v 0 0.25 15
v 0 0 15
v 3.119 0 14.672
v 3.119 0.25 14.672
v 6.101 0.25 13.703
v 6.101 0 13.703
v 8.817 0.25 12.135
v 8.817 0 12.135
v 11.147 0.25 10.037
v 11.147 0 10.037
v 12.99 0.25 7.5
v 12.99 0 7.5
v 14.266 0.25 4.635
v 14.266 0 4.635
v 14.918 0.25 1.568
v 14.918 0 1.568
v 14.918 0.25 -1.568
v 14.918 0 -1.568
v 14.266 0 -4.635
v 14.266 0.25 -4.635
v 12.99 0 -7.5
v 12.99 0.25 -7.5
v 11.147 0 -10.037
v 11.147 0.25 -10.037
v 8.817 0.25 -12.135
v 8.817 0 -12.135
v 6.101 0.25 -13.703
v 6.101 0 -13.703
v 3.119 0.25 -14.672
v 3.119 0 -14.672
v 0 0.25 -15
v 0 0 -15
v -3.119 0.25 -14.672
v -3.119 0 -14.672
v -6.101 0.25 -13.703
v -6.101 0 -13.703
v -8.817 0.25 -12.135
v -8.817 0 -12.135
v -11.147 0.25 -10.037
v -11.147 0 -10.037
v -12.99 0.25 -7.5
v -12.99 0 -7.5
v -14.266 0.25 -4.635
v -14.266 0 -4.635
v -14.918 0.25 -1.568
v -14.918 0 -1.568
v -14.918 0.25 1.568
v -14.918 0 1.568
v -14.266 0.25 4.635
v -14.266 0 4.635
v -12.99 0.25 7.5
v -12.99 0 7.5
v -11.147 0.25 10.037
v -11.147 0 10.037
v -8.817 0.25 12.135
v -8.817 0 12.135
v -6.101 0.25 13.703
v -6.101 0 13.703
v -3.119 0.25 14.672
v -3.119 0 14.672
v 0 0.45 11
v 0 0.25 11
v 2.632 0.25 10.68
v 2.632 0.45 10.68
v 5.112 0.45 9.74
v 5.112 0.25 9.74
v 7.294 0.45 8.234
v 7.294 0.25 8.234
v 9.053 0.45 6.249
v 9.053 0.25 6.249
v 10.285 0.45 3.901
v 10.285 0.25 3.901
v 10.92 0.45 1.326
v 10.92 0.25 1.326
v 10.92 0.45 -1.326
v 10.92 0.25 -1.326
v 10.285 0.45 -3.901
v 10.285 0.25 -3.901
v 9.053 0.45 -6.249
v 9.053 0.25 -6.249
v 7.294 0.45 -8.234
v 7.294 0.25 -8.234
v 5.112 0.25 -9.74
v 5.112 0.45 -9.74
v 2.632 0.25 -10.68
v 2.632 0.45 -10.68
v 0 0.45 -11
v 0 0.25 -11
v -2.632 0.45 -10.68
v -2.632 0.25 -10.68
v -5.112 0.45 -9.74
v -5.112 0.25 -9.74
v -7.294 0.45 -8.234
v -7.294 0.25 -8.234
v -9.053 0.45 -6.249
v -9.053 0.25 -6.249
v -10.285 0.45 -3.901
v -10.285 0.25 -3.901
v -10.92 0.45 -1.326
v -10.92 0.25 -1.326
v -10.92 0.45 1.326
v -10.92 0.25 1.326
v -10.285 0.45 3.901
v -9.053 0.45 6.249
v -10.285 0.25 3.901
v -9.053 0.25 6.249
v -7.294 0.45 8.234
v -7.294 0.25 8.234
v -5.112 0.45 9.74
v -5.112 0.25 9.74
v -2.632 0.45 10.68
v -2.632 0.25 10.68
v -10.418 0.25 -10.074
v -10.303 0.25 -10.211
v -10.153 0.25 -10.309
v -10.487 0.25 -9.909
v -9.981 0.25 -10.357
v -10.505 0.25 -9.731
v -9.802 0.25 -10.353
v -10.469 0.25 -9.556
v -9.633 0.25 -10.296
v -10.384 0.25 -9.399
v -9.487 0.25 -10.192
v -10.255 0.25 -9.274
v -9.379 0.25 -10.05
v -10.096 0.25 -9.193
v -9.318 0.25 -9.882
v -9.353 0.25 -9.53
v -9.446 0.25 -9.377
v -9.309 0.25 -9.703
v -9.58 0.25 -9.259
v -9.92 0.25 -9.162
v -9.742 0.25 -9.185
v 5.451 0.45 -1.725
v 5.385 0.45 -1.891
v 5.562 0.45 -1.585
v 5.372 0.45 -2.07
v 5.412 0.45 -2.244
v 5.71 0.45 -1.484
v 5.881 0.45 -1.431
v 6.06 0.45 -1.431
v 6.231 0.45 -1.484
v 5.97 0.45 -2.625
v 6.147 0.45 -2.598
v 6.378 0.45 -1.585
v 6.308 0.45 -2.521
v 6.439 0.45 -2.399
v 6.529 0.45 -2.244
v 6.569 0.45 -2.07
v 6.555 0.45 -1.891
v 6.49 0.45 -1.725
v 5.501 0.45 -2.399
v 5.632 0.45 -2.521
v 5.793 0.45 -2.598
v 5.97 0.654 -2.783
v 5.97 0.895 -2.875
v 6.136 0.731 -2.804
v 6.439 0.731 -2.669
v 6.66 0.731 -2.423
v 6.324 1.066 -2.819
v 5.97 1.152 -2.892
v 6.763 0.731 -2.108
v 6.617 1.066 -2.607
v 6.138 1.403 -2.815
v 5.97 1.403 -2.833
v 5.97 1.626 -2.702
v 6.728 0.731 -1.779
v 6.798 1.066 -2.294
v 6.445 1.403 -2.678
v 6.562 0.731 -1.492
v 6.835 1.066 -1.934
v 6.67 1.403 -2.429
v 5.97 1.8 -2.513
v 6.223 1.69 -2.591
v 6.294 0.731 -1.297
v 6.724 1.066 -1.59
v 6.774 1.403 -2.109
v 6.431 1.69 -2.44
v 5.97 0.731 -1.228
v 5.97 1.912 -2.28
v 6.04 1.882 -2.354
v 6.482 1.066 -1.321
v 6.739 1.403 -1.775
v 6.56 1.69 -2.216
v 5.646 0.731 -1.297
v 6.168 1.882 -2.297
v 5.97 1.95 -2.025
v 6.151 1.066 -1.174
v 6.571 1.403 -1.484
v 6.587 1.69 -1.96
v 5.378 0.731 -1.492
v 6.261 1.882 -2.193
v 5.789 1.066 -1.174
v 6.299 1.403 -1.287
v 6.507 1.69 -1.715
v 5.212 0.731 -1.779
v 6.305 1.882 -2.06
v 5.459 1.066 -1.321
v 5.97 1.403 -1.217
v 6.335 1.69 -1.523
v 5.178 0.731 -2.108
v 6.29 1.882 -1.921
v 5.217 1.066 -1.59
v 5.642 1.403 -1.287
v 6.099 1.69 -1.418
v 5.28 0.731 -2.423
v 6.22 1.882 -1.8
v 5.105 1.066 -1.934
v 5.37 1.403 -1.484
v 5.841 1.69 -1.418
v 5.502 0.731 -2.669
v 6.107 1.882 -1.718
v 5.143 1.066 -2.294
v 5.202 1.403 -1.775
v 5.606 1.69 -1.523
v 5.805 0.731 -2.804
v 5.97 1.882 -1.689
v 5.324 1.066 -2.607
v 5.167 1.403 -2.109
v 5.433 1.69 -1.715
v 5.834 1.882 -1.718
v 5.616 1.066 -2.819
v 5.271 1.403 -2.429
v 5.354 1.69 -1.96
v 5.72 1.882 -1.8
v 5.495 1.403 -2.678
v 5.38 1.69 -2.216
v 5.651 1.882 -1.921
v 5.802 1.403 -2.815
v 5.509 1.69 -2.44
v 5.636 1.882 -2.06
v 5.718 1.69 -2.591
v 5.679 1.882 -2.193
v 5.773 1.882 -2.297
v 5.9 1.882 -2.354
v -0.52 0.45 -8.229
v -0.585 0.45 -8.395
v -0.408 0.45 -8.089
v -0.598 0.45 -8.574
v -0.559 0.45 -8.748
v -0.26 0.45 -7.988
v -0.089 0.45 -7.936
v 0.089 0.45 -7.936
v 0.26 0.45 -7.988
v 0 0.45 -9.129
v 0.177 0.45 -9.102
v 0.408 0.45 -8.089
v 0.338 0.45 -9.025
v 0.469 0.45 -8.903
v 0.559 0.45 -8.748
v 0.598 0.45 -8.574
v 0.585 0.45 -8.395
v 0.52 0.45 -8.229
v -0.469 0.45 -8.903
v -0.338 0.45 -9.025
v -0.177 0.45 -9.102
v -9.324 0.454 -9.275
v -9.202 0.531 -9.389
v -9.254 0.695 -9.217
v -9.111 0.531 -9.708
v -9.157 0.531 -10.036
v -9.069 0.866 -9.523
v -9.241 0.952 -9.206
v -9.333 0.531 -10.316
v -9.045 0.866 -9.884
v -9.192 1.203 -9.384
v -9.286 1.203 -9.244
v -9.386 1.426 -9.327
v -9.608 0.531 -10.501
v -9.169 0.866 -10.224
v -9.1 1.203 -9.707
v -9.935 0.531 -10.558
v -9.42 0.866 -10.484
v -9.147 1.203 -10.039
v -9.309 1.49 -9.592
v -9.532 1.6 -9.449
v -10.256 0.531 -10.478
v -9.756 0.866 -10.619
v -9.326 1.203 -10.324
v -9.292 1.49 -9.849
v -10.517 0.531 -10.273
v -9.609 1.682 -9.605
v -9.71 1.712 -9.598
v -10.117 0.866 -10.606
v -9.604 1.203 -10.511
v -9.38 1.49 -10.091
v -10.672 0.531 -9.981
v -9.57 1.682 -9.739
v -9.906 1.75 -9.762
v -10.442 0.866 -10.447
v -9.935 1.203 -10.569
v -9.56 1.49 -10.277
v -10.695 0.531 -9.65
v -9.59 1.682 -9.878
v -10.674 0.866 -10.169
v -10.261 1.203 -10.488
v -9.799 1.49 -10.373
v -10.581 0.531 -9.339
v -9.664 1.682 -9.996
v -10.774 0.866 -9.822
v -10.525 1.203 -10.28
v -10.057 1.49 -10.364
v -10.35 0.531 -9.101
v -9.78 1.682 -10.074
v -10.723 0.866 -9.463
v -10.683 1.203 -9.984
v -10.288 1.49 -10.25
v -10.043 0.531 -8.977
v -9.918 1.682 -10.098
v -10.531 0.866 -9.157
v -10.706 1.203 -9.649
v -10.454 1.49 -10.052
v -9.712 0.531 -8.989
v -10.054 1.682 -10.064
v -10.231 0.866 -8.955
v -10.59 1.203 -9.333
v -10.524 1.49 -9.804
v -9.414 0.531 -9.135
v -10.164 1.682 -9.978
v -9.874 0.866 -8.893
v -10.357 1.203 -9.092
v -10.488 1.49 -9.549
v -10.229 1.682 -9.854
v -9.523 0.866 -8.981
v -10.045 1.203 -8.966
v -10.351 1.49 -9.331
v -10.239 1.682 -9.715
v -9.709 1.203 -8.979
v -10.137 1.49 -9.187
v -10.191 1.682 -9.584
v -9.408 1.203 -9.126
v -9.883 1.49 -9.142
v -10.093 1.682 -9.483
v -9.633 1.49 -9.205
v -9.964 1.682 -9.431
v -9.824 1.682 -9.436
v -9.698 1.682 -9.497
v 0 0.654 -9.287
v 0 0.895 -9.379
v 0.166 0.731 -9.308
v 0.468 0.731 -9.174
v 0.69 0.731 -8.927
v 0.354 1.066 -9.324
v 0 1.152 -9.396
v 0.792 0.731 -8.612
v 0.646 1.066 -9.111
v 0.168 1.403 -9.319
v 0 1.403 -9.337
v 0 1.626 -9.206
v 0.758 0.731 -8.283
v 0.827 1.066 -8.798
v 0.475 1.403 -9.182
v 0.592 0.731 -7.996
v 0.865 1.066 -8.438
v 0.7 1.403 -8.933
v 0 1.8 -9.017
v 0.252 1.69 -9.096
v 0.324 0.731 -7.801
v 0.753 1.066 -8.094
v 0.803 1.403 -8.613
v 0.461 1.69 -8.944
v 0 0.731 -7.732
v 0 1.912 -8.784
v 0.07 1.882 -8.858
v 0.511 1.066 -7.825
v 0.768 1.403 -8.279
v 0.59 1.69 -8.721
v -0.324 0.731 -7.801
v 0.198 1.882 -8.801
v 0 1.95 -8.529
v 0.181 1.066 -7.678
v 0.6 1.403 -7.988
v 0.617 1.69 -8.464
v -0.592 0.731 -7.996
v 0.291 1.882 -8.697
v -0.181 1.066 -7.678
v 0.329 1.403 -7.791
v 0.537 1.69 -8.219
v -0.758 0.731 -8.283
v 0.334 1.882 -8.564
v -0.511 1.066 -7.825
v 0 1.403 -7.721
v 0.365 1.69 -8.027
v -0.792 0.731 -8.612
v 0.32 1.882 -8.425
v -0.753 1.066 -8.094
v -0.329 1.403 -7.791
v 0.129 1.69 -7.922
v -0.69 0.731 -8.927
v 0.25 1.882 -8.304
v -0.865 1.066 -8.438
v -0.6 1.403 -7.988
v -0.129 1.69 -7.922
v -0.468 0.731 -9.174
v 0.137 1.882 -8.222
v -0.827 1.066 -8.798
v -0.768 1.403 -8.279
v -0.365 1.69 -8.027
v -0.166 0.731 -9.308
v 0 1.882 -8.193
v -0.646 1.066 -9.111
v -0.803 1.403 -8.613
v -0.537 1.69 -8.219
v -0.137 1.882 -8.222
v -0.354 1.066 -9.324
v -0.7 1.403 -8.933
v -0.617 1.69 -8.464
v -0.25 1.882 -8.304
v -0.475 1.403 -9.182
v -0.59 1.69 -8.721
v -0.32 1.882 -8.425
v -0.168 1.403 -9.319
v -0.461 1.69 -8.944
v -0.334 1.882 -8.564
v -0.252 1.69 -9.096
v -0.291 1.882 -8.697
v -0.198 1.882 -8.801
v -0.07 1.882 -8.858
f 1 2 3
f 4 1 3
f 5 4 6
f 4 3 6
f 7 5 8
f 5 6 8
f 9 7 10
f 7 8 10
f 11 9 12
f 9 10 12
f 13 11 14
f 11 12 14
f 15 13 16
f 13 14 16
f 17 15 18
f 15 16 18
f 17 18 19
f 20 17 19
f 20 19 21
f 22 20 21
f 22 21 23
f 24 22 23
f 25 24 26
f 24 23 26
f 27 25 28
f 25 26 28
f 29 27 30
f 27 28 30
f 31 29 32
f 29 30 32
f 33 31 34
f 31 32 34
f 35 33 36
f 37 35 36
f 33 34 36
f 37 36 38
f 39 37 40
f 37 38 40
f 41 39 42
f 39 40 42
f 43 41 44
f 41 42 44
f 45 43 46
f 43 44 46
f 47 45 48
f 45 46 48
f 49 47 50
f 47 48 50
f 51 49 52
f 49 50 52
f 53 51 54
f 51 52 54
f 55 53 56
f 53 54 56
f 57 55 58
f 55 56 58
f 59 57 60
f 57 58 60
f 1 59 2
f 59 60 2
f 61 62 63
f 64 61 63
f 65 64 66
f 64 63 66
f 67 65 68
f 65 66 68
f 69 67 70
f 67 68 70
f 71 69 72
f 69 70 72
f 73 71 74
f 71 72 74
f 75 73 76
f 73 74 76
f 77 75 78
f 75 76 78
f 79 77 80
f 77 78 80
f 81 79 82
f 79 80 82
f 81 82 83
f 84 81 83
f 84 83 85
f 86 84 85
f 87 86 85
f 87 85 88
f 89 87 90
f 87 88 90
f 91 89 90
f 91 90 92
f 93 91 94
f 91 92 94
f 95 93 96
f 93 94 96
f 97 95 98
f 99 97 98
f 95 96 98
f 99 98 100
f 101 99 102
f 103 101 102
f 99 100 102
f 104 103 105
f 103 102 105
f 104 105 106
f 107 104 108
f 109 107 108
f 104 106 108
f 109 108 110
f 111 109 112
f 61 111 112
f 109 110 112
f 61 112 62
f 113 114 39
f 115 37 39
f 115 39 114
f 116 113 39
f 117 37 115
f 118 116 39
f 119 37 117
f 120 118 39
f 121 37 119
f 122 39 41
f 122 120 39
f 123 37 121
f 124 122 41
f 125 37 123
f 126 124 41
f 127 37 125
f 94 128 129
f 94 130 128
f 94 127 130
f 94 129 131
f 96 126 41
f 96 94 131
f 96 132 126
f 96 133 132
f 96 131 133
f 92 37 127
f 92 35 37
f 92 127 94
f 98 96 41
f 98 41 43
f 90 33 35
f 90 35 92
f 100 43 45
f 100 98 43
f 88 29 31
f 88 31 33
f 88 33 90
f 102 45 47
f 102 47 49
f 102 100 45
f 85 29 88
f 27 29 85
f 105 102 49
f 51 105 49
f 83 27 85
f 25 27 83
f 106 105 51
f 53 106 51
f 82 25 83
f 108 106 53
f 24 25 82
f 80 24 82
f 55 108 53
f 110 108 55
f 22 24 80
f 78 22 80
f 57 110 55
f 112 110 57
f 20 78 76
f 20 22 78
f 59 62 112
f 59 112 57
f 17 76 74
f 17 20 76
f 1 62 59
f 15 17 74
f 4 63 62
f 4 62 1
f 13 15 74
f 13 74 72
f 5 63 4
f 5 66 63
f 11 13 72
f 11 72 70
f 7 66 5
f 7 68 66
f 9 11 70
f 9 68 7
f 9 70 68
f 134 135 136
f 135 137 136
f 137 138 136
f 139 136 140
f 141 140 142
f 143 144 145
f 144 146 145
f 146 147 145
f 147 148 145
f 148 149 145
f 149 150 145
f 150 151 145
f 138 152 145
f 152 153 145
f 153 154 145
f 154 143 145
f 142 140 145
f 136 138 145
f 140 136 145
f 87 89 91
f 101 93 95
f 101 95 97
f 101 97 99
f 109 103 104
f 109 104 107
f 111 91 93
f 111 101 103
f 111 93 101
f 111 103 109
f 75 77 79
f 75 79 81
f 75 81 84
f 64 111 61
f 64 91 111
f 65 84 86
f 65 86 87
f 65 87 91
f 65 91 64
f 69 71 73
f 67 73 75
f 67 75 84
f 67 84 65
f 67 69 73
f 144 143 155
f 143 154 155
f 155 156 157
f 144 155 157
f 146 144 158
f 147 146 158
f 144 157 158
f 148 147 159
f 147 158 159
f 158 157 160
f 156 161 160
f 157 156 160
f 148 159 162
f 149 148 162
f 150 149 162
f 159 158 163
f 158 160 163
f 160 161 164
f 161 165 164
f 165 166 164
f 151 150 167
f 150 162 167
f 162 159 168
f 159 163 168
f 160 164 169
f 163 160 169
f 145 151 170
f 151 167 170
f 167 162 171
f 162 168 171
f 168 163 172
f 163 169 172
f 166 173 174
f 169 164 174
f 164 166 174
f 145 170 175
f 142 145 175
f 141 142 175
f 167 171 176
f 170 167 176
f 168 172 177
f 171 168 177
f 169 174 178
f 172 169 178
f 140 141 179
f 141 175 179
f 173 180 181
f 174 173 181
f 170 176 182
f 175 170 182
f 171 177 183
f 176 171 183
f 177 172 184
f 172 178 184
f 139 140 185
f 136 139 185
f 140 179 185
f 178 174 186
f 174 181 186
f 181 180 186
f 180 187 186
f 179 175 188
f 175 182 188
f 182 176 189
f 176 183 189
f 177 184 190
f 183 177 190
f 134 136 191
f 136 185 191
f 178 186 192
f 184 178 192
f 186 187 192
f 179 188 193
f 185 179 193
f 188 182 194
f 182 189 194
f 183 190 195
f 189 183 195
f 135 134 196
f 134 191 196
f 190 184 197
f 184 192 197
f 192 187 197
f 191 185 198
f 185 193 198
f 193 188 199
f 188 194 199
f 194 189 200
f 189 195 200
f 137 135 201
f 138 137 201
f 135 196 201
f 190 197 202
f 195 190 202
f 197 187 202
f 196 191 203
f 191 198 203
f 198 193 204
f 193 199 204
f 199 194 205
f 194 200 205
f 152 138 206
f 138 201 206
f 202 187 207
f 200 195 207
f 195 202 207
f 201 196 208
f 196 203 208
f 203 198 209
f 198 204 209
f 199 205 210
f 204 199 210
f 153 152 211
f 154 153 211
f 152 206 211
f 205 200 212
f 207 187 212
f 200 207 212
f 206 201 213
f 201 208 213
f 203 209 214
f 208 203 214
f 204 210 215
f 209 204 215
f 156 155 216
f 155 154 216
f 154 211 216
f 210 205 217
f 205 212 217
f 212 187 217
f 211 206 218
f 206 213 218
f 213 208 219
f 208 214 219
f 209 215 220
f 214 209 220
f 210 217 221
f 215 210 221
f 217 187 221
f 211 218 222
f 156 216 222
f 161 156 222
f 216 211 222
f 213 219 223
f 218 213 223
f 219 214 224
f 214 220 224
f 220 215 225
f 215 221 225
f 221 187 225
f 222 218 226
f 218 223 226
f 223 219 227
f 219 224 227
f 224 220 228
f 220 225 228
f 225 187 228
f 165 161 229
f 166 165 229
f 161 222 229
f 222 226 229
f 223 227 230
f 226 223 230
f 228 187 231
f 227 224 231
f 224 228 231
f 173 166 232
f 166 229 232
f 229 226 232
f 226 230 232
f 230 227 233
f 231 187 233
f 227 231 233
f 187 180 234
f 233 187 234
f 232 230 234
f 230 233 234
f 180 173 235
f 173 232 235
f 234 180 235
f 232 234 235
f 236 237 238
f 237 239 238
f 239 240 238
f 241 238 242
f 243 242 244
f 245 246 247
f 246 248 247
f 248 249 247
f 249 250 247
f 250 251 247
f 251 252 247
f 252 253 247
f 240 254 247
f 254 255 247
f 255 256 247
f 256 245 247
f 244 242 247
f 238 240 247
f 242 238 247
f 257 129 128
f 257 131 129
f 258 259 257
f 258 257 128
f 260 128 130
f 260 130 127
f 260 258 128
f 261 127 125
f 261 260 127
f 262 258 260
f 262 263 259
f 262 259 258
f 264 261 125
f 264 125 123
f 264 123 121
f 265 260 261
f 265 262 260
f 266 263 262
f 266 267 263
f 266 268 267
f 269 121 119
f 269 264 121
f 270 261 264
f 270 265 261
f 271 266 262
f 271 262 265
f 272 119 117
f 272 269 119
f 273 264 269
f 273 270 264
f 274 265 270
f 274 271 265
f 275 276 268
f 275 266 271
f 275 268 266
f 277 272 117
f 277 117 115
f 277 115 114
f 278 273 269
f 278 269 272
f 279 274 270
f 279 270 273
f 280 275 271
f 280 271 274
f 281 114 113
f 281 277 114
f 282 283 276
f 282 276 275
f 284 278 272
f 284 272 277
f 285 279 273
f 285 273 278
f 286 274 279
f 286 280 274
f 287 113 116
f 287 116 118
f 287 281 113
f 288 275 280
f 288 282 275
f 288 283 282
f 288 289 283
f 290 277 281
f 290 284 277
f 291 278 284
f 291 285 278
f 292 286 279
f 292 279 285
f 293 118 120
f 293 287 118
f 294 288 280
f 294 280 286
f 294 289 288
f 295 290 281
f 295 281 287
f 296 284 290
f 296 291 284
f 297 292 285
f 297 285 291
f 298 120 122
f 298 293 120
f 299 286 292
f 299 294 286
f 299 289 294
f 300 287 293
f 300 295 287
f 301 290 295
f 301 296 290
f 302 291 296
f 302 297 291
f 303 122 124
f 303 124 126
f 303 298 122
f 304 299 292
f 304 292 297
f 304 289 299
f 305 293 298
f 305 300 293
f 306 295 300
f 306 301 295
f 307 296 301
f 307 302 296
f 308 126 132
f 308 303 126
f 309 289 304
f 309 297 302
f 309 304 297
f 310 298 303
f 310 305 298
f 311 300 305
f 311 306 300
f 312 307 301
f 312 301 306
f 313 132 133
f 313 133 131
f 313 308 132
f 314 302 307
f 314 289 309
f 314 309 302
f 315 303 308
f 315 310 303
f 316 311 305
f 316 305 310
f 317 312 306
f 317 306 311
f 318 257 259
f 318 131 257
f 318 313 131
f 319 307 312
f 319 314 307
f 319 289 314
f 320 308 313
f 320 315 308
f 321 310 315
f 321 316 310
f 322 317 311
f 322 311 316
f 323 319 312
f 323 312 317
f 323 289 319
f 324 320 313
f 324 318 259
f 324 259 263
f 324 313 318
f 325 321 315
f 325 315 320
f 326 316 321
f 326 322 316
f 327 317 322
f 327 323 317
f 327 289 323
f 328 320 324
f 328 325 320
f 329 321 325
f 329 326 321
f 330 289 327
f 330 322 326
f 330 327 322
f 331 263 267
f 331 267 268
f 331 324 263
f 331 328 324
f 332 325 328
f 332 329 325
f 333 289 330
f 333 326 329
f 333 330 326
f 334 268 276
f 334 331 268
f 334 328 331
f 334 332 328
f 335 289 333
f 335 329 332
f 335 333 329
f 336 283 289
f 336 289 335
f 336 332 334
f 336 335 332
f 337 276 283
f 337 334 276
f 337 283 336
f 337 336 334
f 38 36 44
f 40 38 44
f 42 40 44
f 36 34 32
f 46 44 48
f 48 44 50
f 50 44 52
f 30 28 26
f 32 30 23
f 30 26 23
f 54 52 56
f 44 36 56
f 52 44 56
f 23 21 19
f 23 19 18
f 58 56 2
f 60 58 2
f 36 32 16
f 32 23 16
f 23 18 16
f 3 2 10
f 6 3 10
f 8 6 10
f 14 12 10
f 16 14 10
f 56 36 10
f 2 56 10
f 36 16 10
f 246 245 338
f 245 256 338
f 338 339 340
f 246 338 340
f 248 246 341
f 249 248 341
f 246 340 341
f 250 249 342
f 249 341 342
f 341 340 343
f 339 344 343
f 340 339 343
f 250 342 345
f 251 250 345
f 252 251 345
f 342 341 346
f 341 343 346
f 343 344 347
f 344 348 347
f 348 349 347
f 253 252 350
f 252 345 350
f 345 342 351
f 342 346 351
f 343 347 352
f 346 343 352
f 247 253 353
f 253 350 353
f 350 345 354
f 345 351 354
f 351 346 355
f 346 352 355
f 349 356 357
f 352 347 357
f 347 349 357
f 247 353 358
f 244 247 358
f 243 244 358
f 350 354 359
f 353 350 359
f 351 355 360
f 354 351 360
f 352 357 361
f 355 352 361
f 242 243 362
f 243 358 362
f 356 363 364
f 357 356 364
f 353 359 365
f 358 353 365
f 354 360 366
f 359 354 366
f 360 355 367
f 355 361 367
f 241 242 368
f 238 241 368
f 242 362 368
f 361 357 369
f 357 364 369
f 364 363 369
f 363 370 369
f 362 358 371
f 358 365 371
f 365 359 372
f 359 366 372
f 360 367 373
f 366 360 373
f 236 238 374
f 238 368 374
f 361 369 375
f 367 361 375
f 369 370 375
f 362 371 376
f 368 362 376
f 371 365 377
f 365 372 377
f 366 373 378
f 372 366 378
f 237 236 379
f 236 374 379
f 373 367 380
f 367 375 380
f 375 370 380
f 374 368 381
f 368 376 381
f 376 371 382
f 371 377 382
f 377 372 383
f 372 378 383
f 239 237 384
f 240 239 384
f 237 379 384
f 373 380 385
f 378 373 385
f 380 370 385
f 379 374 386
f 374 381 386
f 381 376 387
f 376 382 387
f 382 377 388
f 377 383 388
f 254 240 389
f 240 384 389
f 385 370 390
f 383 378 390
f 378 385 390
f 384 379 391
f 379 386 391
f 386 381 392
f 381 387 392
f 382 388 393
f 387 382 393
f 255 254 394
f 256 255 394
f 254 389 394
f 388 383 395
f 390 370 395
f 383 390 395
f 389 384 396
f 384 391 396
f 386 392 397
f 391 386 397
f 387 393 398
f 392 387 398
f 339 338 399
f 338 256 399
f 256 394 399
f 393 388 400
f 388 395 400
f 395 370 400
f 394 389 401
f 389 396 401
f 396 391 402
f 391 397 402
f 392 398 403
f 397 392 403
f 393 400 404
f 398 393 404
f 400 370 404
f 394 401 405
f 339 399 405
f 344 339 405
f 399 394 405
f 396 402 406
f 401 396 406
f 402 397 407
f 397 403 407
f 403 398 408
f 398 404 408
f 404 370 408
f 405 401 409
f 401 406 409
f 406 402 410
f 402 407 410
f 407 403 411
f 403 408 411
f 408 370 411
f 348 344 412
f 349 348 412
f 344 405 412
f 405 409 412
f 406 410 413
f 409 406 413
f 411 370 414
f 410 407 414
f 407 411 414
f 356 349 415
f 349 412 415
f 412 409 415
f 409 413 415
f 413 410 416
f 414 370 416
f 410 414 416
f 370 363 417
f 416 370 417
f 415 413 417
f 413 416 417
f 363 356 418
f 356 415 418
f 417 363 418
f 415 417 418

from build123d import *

# Parameters (mm, degrees)
SKETCH1_R           = 15
BOSS_EXTRUDE1_DEPTH = 0.25
SKETCH2_R           = 11
BOSS_EXTRUDE2_DEPTH = 0.2


with BuildPart() as part:
    # Sketch1 → Boss-Extrude1 (new body)
    with BuildSketch(Plane(origin=(0, 0, 0), x_dir=(1, 0, 0), z_dir=(0, 1, 0))):
        with Locations(Location((0, 0, 0), (0, 0, 270))):
            Circle(SKETCH1_R)
    extrude(amount=BOSS_EXTRUDE1_DEPTH)

    # Sketch2 → Boss-Extrude2 (add)
    with BuildSketch(Plane(origin=(0, 0.25, 0), x_dir=(1, 0, 0), z_dir=(0, 1, 0))):
        with Locations(Location((0, 0, 0), (0, 0, 270))):
            Circle(SKETCH2_R)
    extrude(amount=BOSS_EXTRUDE2_DEPTH)

    # Sketch7 → Revolve2 (revolve)
    with BuildSketch(Plane(origin=(0.725222659, 0, -0.866726662), x_dir=(0.7669357638780605, 0, 0.6417238768230272), z_dir=(-0.6417238768230272, 0, 0.7669357638780605))):
        with BuildLine():
            Line((-13.861668199, 0.25), (-13.261668199, 0.25))
            ThreePointArc((-13.261668199, 0.25), (-13.053893478, 1.203109888), (-13.861668199, 1.75))
            Line((-13.861668199, 1.75), (-13.861668199, 0.25))
        make_face()
    revolve(axis=Axis((-9.90578643, 0.45, -9.762090118), (0, 1, 0)))


with BuildPart() as body_2:
    # Sketch5 → Revolve1 (revolve)
    with BuildSketch(Plane(origin=(0, 0, 0), x_dir=(0, 0, -1), z_dir=(1, 0, 0))):
        with BuildLine():
            Line((8.528956605, 0.45), (9.128956605, 0.45))
            ThreePointArc((9.128956605, 0.45), (9.336731326, 1.403109888), (8.528956605, 1.95))
            Line((8.528956605, 1.95), (8.528956605, 0.45))
        make_face()
    revolve(axis=Axis((0, 1.95, -8.528956605), (0, -1, 0)))


with BuildPart() as body_3:
    # Body-Move/Copy2: copy of body 2
    add(body_2.part.moved(Location((5.970284631, 0, 6.504179649))))


solid = Compound([part.part, body_2.part, body_3.part])
